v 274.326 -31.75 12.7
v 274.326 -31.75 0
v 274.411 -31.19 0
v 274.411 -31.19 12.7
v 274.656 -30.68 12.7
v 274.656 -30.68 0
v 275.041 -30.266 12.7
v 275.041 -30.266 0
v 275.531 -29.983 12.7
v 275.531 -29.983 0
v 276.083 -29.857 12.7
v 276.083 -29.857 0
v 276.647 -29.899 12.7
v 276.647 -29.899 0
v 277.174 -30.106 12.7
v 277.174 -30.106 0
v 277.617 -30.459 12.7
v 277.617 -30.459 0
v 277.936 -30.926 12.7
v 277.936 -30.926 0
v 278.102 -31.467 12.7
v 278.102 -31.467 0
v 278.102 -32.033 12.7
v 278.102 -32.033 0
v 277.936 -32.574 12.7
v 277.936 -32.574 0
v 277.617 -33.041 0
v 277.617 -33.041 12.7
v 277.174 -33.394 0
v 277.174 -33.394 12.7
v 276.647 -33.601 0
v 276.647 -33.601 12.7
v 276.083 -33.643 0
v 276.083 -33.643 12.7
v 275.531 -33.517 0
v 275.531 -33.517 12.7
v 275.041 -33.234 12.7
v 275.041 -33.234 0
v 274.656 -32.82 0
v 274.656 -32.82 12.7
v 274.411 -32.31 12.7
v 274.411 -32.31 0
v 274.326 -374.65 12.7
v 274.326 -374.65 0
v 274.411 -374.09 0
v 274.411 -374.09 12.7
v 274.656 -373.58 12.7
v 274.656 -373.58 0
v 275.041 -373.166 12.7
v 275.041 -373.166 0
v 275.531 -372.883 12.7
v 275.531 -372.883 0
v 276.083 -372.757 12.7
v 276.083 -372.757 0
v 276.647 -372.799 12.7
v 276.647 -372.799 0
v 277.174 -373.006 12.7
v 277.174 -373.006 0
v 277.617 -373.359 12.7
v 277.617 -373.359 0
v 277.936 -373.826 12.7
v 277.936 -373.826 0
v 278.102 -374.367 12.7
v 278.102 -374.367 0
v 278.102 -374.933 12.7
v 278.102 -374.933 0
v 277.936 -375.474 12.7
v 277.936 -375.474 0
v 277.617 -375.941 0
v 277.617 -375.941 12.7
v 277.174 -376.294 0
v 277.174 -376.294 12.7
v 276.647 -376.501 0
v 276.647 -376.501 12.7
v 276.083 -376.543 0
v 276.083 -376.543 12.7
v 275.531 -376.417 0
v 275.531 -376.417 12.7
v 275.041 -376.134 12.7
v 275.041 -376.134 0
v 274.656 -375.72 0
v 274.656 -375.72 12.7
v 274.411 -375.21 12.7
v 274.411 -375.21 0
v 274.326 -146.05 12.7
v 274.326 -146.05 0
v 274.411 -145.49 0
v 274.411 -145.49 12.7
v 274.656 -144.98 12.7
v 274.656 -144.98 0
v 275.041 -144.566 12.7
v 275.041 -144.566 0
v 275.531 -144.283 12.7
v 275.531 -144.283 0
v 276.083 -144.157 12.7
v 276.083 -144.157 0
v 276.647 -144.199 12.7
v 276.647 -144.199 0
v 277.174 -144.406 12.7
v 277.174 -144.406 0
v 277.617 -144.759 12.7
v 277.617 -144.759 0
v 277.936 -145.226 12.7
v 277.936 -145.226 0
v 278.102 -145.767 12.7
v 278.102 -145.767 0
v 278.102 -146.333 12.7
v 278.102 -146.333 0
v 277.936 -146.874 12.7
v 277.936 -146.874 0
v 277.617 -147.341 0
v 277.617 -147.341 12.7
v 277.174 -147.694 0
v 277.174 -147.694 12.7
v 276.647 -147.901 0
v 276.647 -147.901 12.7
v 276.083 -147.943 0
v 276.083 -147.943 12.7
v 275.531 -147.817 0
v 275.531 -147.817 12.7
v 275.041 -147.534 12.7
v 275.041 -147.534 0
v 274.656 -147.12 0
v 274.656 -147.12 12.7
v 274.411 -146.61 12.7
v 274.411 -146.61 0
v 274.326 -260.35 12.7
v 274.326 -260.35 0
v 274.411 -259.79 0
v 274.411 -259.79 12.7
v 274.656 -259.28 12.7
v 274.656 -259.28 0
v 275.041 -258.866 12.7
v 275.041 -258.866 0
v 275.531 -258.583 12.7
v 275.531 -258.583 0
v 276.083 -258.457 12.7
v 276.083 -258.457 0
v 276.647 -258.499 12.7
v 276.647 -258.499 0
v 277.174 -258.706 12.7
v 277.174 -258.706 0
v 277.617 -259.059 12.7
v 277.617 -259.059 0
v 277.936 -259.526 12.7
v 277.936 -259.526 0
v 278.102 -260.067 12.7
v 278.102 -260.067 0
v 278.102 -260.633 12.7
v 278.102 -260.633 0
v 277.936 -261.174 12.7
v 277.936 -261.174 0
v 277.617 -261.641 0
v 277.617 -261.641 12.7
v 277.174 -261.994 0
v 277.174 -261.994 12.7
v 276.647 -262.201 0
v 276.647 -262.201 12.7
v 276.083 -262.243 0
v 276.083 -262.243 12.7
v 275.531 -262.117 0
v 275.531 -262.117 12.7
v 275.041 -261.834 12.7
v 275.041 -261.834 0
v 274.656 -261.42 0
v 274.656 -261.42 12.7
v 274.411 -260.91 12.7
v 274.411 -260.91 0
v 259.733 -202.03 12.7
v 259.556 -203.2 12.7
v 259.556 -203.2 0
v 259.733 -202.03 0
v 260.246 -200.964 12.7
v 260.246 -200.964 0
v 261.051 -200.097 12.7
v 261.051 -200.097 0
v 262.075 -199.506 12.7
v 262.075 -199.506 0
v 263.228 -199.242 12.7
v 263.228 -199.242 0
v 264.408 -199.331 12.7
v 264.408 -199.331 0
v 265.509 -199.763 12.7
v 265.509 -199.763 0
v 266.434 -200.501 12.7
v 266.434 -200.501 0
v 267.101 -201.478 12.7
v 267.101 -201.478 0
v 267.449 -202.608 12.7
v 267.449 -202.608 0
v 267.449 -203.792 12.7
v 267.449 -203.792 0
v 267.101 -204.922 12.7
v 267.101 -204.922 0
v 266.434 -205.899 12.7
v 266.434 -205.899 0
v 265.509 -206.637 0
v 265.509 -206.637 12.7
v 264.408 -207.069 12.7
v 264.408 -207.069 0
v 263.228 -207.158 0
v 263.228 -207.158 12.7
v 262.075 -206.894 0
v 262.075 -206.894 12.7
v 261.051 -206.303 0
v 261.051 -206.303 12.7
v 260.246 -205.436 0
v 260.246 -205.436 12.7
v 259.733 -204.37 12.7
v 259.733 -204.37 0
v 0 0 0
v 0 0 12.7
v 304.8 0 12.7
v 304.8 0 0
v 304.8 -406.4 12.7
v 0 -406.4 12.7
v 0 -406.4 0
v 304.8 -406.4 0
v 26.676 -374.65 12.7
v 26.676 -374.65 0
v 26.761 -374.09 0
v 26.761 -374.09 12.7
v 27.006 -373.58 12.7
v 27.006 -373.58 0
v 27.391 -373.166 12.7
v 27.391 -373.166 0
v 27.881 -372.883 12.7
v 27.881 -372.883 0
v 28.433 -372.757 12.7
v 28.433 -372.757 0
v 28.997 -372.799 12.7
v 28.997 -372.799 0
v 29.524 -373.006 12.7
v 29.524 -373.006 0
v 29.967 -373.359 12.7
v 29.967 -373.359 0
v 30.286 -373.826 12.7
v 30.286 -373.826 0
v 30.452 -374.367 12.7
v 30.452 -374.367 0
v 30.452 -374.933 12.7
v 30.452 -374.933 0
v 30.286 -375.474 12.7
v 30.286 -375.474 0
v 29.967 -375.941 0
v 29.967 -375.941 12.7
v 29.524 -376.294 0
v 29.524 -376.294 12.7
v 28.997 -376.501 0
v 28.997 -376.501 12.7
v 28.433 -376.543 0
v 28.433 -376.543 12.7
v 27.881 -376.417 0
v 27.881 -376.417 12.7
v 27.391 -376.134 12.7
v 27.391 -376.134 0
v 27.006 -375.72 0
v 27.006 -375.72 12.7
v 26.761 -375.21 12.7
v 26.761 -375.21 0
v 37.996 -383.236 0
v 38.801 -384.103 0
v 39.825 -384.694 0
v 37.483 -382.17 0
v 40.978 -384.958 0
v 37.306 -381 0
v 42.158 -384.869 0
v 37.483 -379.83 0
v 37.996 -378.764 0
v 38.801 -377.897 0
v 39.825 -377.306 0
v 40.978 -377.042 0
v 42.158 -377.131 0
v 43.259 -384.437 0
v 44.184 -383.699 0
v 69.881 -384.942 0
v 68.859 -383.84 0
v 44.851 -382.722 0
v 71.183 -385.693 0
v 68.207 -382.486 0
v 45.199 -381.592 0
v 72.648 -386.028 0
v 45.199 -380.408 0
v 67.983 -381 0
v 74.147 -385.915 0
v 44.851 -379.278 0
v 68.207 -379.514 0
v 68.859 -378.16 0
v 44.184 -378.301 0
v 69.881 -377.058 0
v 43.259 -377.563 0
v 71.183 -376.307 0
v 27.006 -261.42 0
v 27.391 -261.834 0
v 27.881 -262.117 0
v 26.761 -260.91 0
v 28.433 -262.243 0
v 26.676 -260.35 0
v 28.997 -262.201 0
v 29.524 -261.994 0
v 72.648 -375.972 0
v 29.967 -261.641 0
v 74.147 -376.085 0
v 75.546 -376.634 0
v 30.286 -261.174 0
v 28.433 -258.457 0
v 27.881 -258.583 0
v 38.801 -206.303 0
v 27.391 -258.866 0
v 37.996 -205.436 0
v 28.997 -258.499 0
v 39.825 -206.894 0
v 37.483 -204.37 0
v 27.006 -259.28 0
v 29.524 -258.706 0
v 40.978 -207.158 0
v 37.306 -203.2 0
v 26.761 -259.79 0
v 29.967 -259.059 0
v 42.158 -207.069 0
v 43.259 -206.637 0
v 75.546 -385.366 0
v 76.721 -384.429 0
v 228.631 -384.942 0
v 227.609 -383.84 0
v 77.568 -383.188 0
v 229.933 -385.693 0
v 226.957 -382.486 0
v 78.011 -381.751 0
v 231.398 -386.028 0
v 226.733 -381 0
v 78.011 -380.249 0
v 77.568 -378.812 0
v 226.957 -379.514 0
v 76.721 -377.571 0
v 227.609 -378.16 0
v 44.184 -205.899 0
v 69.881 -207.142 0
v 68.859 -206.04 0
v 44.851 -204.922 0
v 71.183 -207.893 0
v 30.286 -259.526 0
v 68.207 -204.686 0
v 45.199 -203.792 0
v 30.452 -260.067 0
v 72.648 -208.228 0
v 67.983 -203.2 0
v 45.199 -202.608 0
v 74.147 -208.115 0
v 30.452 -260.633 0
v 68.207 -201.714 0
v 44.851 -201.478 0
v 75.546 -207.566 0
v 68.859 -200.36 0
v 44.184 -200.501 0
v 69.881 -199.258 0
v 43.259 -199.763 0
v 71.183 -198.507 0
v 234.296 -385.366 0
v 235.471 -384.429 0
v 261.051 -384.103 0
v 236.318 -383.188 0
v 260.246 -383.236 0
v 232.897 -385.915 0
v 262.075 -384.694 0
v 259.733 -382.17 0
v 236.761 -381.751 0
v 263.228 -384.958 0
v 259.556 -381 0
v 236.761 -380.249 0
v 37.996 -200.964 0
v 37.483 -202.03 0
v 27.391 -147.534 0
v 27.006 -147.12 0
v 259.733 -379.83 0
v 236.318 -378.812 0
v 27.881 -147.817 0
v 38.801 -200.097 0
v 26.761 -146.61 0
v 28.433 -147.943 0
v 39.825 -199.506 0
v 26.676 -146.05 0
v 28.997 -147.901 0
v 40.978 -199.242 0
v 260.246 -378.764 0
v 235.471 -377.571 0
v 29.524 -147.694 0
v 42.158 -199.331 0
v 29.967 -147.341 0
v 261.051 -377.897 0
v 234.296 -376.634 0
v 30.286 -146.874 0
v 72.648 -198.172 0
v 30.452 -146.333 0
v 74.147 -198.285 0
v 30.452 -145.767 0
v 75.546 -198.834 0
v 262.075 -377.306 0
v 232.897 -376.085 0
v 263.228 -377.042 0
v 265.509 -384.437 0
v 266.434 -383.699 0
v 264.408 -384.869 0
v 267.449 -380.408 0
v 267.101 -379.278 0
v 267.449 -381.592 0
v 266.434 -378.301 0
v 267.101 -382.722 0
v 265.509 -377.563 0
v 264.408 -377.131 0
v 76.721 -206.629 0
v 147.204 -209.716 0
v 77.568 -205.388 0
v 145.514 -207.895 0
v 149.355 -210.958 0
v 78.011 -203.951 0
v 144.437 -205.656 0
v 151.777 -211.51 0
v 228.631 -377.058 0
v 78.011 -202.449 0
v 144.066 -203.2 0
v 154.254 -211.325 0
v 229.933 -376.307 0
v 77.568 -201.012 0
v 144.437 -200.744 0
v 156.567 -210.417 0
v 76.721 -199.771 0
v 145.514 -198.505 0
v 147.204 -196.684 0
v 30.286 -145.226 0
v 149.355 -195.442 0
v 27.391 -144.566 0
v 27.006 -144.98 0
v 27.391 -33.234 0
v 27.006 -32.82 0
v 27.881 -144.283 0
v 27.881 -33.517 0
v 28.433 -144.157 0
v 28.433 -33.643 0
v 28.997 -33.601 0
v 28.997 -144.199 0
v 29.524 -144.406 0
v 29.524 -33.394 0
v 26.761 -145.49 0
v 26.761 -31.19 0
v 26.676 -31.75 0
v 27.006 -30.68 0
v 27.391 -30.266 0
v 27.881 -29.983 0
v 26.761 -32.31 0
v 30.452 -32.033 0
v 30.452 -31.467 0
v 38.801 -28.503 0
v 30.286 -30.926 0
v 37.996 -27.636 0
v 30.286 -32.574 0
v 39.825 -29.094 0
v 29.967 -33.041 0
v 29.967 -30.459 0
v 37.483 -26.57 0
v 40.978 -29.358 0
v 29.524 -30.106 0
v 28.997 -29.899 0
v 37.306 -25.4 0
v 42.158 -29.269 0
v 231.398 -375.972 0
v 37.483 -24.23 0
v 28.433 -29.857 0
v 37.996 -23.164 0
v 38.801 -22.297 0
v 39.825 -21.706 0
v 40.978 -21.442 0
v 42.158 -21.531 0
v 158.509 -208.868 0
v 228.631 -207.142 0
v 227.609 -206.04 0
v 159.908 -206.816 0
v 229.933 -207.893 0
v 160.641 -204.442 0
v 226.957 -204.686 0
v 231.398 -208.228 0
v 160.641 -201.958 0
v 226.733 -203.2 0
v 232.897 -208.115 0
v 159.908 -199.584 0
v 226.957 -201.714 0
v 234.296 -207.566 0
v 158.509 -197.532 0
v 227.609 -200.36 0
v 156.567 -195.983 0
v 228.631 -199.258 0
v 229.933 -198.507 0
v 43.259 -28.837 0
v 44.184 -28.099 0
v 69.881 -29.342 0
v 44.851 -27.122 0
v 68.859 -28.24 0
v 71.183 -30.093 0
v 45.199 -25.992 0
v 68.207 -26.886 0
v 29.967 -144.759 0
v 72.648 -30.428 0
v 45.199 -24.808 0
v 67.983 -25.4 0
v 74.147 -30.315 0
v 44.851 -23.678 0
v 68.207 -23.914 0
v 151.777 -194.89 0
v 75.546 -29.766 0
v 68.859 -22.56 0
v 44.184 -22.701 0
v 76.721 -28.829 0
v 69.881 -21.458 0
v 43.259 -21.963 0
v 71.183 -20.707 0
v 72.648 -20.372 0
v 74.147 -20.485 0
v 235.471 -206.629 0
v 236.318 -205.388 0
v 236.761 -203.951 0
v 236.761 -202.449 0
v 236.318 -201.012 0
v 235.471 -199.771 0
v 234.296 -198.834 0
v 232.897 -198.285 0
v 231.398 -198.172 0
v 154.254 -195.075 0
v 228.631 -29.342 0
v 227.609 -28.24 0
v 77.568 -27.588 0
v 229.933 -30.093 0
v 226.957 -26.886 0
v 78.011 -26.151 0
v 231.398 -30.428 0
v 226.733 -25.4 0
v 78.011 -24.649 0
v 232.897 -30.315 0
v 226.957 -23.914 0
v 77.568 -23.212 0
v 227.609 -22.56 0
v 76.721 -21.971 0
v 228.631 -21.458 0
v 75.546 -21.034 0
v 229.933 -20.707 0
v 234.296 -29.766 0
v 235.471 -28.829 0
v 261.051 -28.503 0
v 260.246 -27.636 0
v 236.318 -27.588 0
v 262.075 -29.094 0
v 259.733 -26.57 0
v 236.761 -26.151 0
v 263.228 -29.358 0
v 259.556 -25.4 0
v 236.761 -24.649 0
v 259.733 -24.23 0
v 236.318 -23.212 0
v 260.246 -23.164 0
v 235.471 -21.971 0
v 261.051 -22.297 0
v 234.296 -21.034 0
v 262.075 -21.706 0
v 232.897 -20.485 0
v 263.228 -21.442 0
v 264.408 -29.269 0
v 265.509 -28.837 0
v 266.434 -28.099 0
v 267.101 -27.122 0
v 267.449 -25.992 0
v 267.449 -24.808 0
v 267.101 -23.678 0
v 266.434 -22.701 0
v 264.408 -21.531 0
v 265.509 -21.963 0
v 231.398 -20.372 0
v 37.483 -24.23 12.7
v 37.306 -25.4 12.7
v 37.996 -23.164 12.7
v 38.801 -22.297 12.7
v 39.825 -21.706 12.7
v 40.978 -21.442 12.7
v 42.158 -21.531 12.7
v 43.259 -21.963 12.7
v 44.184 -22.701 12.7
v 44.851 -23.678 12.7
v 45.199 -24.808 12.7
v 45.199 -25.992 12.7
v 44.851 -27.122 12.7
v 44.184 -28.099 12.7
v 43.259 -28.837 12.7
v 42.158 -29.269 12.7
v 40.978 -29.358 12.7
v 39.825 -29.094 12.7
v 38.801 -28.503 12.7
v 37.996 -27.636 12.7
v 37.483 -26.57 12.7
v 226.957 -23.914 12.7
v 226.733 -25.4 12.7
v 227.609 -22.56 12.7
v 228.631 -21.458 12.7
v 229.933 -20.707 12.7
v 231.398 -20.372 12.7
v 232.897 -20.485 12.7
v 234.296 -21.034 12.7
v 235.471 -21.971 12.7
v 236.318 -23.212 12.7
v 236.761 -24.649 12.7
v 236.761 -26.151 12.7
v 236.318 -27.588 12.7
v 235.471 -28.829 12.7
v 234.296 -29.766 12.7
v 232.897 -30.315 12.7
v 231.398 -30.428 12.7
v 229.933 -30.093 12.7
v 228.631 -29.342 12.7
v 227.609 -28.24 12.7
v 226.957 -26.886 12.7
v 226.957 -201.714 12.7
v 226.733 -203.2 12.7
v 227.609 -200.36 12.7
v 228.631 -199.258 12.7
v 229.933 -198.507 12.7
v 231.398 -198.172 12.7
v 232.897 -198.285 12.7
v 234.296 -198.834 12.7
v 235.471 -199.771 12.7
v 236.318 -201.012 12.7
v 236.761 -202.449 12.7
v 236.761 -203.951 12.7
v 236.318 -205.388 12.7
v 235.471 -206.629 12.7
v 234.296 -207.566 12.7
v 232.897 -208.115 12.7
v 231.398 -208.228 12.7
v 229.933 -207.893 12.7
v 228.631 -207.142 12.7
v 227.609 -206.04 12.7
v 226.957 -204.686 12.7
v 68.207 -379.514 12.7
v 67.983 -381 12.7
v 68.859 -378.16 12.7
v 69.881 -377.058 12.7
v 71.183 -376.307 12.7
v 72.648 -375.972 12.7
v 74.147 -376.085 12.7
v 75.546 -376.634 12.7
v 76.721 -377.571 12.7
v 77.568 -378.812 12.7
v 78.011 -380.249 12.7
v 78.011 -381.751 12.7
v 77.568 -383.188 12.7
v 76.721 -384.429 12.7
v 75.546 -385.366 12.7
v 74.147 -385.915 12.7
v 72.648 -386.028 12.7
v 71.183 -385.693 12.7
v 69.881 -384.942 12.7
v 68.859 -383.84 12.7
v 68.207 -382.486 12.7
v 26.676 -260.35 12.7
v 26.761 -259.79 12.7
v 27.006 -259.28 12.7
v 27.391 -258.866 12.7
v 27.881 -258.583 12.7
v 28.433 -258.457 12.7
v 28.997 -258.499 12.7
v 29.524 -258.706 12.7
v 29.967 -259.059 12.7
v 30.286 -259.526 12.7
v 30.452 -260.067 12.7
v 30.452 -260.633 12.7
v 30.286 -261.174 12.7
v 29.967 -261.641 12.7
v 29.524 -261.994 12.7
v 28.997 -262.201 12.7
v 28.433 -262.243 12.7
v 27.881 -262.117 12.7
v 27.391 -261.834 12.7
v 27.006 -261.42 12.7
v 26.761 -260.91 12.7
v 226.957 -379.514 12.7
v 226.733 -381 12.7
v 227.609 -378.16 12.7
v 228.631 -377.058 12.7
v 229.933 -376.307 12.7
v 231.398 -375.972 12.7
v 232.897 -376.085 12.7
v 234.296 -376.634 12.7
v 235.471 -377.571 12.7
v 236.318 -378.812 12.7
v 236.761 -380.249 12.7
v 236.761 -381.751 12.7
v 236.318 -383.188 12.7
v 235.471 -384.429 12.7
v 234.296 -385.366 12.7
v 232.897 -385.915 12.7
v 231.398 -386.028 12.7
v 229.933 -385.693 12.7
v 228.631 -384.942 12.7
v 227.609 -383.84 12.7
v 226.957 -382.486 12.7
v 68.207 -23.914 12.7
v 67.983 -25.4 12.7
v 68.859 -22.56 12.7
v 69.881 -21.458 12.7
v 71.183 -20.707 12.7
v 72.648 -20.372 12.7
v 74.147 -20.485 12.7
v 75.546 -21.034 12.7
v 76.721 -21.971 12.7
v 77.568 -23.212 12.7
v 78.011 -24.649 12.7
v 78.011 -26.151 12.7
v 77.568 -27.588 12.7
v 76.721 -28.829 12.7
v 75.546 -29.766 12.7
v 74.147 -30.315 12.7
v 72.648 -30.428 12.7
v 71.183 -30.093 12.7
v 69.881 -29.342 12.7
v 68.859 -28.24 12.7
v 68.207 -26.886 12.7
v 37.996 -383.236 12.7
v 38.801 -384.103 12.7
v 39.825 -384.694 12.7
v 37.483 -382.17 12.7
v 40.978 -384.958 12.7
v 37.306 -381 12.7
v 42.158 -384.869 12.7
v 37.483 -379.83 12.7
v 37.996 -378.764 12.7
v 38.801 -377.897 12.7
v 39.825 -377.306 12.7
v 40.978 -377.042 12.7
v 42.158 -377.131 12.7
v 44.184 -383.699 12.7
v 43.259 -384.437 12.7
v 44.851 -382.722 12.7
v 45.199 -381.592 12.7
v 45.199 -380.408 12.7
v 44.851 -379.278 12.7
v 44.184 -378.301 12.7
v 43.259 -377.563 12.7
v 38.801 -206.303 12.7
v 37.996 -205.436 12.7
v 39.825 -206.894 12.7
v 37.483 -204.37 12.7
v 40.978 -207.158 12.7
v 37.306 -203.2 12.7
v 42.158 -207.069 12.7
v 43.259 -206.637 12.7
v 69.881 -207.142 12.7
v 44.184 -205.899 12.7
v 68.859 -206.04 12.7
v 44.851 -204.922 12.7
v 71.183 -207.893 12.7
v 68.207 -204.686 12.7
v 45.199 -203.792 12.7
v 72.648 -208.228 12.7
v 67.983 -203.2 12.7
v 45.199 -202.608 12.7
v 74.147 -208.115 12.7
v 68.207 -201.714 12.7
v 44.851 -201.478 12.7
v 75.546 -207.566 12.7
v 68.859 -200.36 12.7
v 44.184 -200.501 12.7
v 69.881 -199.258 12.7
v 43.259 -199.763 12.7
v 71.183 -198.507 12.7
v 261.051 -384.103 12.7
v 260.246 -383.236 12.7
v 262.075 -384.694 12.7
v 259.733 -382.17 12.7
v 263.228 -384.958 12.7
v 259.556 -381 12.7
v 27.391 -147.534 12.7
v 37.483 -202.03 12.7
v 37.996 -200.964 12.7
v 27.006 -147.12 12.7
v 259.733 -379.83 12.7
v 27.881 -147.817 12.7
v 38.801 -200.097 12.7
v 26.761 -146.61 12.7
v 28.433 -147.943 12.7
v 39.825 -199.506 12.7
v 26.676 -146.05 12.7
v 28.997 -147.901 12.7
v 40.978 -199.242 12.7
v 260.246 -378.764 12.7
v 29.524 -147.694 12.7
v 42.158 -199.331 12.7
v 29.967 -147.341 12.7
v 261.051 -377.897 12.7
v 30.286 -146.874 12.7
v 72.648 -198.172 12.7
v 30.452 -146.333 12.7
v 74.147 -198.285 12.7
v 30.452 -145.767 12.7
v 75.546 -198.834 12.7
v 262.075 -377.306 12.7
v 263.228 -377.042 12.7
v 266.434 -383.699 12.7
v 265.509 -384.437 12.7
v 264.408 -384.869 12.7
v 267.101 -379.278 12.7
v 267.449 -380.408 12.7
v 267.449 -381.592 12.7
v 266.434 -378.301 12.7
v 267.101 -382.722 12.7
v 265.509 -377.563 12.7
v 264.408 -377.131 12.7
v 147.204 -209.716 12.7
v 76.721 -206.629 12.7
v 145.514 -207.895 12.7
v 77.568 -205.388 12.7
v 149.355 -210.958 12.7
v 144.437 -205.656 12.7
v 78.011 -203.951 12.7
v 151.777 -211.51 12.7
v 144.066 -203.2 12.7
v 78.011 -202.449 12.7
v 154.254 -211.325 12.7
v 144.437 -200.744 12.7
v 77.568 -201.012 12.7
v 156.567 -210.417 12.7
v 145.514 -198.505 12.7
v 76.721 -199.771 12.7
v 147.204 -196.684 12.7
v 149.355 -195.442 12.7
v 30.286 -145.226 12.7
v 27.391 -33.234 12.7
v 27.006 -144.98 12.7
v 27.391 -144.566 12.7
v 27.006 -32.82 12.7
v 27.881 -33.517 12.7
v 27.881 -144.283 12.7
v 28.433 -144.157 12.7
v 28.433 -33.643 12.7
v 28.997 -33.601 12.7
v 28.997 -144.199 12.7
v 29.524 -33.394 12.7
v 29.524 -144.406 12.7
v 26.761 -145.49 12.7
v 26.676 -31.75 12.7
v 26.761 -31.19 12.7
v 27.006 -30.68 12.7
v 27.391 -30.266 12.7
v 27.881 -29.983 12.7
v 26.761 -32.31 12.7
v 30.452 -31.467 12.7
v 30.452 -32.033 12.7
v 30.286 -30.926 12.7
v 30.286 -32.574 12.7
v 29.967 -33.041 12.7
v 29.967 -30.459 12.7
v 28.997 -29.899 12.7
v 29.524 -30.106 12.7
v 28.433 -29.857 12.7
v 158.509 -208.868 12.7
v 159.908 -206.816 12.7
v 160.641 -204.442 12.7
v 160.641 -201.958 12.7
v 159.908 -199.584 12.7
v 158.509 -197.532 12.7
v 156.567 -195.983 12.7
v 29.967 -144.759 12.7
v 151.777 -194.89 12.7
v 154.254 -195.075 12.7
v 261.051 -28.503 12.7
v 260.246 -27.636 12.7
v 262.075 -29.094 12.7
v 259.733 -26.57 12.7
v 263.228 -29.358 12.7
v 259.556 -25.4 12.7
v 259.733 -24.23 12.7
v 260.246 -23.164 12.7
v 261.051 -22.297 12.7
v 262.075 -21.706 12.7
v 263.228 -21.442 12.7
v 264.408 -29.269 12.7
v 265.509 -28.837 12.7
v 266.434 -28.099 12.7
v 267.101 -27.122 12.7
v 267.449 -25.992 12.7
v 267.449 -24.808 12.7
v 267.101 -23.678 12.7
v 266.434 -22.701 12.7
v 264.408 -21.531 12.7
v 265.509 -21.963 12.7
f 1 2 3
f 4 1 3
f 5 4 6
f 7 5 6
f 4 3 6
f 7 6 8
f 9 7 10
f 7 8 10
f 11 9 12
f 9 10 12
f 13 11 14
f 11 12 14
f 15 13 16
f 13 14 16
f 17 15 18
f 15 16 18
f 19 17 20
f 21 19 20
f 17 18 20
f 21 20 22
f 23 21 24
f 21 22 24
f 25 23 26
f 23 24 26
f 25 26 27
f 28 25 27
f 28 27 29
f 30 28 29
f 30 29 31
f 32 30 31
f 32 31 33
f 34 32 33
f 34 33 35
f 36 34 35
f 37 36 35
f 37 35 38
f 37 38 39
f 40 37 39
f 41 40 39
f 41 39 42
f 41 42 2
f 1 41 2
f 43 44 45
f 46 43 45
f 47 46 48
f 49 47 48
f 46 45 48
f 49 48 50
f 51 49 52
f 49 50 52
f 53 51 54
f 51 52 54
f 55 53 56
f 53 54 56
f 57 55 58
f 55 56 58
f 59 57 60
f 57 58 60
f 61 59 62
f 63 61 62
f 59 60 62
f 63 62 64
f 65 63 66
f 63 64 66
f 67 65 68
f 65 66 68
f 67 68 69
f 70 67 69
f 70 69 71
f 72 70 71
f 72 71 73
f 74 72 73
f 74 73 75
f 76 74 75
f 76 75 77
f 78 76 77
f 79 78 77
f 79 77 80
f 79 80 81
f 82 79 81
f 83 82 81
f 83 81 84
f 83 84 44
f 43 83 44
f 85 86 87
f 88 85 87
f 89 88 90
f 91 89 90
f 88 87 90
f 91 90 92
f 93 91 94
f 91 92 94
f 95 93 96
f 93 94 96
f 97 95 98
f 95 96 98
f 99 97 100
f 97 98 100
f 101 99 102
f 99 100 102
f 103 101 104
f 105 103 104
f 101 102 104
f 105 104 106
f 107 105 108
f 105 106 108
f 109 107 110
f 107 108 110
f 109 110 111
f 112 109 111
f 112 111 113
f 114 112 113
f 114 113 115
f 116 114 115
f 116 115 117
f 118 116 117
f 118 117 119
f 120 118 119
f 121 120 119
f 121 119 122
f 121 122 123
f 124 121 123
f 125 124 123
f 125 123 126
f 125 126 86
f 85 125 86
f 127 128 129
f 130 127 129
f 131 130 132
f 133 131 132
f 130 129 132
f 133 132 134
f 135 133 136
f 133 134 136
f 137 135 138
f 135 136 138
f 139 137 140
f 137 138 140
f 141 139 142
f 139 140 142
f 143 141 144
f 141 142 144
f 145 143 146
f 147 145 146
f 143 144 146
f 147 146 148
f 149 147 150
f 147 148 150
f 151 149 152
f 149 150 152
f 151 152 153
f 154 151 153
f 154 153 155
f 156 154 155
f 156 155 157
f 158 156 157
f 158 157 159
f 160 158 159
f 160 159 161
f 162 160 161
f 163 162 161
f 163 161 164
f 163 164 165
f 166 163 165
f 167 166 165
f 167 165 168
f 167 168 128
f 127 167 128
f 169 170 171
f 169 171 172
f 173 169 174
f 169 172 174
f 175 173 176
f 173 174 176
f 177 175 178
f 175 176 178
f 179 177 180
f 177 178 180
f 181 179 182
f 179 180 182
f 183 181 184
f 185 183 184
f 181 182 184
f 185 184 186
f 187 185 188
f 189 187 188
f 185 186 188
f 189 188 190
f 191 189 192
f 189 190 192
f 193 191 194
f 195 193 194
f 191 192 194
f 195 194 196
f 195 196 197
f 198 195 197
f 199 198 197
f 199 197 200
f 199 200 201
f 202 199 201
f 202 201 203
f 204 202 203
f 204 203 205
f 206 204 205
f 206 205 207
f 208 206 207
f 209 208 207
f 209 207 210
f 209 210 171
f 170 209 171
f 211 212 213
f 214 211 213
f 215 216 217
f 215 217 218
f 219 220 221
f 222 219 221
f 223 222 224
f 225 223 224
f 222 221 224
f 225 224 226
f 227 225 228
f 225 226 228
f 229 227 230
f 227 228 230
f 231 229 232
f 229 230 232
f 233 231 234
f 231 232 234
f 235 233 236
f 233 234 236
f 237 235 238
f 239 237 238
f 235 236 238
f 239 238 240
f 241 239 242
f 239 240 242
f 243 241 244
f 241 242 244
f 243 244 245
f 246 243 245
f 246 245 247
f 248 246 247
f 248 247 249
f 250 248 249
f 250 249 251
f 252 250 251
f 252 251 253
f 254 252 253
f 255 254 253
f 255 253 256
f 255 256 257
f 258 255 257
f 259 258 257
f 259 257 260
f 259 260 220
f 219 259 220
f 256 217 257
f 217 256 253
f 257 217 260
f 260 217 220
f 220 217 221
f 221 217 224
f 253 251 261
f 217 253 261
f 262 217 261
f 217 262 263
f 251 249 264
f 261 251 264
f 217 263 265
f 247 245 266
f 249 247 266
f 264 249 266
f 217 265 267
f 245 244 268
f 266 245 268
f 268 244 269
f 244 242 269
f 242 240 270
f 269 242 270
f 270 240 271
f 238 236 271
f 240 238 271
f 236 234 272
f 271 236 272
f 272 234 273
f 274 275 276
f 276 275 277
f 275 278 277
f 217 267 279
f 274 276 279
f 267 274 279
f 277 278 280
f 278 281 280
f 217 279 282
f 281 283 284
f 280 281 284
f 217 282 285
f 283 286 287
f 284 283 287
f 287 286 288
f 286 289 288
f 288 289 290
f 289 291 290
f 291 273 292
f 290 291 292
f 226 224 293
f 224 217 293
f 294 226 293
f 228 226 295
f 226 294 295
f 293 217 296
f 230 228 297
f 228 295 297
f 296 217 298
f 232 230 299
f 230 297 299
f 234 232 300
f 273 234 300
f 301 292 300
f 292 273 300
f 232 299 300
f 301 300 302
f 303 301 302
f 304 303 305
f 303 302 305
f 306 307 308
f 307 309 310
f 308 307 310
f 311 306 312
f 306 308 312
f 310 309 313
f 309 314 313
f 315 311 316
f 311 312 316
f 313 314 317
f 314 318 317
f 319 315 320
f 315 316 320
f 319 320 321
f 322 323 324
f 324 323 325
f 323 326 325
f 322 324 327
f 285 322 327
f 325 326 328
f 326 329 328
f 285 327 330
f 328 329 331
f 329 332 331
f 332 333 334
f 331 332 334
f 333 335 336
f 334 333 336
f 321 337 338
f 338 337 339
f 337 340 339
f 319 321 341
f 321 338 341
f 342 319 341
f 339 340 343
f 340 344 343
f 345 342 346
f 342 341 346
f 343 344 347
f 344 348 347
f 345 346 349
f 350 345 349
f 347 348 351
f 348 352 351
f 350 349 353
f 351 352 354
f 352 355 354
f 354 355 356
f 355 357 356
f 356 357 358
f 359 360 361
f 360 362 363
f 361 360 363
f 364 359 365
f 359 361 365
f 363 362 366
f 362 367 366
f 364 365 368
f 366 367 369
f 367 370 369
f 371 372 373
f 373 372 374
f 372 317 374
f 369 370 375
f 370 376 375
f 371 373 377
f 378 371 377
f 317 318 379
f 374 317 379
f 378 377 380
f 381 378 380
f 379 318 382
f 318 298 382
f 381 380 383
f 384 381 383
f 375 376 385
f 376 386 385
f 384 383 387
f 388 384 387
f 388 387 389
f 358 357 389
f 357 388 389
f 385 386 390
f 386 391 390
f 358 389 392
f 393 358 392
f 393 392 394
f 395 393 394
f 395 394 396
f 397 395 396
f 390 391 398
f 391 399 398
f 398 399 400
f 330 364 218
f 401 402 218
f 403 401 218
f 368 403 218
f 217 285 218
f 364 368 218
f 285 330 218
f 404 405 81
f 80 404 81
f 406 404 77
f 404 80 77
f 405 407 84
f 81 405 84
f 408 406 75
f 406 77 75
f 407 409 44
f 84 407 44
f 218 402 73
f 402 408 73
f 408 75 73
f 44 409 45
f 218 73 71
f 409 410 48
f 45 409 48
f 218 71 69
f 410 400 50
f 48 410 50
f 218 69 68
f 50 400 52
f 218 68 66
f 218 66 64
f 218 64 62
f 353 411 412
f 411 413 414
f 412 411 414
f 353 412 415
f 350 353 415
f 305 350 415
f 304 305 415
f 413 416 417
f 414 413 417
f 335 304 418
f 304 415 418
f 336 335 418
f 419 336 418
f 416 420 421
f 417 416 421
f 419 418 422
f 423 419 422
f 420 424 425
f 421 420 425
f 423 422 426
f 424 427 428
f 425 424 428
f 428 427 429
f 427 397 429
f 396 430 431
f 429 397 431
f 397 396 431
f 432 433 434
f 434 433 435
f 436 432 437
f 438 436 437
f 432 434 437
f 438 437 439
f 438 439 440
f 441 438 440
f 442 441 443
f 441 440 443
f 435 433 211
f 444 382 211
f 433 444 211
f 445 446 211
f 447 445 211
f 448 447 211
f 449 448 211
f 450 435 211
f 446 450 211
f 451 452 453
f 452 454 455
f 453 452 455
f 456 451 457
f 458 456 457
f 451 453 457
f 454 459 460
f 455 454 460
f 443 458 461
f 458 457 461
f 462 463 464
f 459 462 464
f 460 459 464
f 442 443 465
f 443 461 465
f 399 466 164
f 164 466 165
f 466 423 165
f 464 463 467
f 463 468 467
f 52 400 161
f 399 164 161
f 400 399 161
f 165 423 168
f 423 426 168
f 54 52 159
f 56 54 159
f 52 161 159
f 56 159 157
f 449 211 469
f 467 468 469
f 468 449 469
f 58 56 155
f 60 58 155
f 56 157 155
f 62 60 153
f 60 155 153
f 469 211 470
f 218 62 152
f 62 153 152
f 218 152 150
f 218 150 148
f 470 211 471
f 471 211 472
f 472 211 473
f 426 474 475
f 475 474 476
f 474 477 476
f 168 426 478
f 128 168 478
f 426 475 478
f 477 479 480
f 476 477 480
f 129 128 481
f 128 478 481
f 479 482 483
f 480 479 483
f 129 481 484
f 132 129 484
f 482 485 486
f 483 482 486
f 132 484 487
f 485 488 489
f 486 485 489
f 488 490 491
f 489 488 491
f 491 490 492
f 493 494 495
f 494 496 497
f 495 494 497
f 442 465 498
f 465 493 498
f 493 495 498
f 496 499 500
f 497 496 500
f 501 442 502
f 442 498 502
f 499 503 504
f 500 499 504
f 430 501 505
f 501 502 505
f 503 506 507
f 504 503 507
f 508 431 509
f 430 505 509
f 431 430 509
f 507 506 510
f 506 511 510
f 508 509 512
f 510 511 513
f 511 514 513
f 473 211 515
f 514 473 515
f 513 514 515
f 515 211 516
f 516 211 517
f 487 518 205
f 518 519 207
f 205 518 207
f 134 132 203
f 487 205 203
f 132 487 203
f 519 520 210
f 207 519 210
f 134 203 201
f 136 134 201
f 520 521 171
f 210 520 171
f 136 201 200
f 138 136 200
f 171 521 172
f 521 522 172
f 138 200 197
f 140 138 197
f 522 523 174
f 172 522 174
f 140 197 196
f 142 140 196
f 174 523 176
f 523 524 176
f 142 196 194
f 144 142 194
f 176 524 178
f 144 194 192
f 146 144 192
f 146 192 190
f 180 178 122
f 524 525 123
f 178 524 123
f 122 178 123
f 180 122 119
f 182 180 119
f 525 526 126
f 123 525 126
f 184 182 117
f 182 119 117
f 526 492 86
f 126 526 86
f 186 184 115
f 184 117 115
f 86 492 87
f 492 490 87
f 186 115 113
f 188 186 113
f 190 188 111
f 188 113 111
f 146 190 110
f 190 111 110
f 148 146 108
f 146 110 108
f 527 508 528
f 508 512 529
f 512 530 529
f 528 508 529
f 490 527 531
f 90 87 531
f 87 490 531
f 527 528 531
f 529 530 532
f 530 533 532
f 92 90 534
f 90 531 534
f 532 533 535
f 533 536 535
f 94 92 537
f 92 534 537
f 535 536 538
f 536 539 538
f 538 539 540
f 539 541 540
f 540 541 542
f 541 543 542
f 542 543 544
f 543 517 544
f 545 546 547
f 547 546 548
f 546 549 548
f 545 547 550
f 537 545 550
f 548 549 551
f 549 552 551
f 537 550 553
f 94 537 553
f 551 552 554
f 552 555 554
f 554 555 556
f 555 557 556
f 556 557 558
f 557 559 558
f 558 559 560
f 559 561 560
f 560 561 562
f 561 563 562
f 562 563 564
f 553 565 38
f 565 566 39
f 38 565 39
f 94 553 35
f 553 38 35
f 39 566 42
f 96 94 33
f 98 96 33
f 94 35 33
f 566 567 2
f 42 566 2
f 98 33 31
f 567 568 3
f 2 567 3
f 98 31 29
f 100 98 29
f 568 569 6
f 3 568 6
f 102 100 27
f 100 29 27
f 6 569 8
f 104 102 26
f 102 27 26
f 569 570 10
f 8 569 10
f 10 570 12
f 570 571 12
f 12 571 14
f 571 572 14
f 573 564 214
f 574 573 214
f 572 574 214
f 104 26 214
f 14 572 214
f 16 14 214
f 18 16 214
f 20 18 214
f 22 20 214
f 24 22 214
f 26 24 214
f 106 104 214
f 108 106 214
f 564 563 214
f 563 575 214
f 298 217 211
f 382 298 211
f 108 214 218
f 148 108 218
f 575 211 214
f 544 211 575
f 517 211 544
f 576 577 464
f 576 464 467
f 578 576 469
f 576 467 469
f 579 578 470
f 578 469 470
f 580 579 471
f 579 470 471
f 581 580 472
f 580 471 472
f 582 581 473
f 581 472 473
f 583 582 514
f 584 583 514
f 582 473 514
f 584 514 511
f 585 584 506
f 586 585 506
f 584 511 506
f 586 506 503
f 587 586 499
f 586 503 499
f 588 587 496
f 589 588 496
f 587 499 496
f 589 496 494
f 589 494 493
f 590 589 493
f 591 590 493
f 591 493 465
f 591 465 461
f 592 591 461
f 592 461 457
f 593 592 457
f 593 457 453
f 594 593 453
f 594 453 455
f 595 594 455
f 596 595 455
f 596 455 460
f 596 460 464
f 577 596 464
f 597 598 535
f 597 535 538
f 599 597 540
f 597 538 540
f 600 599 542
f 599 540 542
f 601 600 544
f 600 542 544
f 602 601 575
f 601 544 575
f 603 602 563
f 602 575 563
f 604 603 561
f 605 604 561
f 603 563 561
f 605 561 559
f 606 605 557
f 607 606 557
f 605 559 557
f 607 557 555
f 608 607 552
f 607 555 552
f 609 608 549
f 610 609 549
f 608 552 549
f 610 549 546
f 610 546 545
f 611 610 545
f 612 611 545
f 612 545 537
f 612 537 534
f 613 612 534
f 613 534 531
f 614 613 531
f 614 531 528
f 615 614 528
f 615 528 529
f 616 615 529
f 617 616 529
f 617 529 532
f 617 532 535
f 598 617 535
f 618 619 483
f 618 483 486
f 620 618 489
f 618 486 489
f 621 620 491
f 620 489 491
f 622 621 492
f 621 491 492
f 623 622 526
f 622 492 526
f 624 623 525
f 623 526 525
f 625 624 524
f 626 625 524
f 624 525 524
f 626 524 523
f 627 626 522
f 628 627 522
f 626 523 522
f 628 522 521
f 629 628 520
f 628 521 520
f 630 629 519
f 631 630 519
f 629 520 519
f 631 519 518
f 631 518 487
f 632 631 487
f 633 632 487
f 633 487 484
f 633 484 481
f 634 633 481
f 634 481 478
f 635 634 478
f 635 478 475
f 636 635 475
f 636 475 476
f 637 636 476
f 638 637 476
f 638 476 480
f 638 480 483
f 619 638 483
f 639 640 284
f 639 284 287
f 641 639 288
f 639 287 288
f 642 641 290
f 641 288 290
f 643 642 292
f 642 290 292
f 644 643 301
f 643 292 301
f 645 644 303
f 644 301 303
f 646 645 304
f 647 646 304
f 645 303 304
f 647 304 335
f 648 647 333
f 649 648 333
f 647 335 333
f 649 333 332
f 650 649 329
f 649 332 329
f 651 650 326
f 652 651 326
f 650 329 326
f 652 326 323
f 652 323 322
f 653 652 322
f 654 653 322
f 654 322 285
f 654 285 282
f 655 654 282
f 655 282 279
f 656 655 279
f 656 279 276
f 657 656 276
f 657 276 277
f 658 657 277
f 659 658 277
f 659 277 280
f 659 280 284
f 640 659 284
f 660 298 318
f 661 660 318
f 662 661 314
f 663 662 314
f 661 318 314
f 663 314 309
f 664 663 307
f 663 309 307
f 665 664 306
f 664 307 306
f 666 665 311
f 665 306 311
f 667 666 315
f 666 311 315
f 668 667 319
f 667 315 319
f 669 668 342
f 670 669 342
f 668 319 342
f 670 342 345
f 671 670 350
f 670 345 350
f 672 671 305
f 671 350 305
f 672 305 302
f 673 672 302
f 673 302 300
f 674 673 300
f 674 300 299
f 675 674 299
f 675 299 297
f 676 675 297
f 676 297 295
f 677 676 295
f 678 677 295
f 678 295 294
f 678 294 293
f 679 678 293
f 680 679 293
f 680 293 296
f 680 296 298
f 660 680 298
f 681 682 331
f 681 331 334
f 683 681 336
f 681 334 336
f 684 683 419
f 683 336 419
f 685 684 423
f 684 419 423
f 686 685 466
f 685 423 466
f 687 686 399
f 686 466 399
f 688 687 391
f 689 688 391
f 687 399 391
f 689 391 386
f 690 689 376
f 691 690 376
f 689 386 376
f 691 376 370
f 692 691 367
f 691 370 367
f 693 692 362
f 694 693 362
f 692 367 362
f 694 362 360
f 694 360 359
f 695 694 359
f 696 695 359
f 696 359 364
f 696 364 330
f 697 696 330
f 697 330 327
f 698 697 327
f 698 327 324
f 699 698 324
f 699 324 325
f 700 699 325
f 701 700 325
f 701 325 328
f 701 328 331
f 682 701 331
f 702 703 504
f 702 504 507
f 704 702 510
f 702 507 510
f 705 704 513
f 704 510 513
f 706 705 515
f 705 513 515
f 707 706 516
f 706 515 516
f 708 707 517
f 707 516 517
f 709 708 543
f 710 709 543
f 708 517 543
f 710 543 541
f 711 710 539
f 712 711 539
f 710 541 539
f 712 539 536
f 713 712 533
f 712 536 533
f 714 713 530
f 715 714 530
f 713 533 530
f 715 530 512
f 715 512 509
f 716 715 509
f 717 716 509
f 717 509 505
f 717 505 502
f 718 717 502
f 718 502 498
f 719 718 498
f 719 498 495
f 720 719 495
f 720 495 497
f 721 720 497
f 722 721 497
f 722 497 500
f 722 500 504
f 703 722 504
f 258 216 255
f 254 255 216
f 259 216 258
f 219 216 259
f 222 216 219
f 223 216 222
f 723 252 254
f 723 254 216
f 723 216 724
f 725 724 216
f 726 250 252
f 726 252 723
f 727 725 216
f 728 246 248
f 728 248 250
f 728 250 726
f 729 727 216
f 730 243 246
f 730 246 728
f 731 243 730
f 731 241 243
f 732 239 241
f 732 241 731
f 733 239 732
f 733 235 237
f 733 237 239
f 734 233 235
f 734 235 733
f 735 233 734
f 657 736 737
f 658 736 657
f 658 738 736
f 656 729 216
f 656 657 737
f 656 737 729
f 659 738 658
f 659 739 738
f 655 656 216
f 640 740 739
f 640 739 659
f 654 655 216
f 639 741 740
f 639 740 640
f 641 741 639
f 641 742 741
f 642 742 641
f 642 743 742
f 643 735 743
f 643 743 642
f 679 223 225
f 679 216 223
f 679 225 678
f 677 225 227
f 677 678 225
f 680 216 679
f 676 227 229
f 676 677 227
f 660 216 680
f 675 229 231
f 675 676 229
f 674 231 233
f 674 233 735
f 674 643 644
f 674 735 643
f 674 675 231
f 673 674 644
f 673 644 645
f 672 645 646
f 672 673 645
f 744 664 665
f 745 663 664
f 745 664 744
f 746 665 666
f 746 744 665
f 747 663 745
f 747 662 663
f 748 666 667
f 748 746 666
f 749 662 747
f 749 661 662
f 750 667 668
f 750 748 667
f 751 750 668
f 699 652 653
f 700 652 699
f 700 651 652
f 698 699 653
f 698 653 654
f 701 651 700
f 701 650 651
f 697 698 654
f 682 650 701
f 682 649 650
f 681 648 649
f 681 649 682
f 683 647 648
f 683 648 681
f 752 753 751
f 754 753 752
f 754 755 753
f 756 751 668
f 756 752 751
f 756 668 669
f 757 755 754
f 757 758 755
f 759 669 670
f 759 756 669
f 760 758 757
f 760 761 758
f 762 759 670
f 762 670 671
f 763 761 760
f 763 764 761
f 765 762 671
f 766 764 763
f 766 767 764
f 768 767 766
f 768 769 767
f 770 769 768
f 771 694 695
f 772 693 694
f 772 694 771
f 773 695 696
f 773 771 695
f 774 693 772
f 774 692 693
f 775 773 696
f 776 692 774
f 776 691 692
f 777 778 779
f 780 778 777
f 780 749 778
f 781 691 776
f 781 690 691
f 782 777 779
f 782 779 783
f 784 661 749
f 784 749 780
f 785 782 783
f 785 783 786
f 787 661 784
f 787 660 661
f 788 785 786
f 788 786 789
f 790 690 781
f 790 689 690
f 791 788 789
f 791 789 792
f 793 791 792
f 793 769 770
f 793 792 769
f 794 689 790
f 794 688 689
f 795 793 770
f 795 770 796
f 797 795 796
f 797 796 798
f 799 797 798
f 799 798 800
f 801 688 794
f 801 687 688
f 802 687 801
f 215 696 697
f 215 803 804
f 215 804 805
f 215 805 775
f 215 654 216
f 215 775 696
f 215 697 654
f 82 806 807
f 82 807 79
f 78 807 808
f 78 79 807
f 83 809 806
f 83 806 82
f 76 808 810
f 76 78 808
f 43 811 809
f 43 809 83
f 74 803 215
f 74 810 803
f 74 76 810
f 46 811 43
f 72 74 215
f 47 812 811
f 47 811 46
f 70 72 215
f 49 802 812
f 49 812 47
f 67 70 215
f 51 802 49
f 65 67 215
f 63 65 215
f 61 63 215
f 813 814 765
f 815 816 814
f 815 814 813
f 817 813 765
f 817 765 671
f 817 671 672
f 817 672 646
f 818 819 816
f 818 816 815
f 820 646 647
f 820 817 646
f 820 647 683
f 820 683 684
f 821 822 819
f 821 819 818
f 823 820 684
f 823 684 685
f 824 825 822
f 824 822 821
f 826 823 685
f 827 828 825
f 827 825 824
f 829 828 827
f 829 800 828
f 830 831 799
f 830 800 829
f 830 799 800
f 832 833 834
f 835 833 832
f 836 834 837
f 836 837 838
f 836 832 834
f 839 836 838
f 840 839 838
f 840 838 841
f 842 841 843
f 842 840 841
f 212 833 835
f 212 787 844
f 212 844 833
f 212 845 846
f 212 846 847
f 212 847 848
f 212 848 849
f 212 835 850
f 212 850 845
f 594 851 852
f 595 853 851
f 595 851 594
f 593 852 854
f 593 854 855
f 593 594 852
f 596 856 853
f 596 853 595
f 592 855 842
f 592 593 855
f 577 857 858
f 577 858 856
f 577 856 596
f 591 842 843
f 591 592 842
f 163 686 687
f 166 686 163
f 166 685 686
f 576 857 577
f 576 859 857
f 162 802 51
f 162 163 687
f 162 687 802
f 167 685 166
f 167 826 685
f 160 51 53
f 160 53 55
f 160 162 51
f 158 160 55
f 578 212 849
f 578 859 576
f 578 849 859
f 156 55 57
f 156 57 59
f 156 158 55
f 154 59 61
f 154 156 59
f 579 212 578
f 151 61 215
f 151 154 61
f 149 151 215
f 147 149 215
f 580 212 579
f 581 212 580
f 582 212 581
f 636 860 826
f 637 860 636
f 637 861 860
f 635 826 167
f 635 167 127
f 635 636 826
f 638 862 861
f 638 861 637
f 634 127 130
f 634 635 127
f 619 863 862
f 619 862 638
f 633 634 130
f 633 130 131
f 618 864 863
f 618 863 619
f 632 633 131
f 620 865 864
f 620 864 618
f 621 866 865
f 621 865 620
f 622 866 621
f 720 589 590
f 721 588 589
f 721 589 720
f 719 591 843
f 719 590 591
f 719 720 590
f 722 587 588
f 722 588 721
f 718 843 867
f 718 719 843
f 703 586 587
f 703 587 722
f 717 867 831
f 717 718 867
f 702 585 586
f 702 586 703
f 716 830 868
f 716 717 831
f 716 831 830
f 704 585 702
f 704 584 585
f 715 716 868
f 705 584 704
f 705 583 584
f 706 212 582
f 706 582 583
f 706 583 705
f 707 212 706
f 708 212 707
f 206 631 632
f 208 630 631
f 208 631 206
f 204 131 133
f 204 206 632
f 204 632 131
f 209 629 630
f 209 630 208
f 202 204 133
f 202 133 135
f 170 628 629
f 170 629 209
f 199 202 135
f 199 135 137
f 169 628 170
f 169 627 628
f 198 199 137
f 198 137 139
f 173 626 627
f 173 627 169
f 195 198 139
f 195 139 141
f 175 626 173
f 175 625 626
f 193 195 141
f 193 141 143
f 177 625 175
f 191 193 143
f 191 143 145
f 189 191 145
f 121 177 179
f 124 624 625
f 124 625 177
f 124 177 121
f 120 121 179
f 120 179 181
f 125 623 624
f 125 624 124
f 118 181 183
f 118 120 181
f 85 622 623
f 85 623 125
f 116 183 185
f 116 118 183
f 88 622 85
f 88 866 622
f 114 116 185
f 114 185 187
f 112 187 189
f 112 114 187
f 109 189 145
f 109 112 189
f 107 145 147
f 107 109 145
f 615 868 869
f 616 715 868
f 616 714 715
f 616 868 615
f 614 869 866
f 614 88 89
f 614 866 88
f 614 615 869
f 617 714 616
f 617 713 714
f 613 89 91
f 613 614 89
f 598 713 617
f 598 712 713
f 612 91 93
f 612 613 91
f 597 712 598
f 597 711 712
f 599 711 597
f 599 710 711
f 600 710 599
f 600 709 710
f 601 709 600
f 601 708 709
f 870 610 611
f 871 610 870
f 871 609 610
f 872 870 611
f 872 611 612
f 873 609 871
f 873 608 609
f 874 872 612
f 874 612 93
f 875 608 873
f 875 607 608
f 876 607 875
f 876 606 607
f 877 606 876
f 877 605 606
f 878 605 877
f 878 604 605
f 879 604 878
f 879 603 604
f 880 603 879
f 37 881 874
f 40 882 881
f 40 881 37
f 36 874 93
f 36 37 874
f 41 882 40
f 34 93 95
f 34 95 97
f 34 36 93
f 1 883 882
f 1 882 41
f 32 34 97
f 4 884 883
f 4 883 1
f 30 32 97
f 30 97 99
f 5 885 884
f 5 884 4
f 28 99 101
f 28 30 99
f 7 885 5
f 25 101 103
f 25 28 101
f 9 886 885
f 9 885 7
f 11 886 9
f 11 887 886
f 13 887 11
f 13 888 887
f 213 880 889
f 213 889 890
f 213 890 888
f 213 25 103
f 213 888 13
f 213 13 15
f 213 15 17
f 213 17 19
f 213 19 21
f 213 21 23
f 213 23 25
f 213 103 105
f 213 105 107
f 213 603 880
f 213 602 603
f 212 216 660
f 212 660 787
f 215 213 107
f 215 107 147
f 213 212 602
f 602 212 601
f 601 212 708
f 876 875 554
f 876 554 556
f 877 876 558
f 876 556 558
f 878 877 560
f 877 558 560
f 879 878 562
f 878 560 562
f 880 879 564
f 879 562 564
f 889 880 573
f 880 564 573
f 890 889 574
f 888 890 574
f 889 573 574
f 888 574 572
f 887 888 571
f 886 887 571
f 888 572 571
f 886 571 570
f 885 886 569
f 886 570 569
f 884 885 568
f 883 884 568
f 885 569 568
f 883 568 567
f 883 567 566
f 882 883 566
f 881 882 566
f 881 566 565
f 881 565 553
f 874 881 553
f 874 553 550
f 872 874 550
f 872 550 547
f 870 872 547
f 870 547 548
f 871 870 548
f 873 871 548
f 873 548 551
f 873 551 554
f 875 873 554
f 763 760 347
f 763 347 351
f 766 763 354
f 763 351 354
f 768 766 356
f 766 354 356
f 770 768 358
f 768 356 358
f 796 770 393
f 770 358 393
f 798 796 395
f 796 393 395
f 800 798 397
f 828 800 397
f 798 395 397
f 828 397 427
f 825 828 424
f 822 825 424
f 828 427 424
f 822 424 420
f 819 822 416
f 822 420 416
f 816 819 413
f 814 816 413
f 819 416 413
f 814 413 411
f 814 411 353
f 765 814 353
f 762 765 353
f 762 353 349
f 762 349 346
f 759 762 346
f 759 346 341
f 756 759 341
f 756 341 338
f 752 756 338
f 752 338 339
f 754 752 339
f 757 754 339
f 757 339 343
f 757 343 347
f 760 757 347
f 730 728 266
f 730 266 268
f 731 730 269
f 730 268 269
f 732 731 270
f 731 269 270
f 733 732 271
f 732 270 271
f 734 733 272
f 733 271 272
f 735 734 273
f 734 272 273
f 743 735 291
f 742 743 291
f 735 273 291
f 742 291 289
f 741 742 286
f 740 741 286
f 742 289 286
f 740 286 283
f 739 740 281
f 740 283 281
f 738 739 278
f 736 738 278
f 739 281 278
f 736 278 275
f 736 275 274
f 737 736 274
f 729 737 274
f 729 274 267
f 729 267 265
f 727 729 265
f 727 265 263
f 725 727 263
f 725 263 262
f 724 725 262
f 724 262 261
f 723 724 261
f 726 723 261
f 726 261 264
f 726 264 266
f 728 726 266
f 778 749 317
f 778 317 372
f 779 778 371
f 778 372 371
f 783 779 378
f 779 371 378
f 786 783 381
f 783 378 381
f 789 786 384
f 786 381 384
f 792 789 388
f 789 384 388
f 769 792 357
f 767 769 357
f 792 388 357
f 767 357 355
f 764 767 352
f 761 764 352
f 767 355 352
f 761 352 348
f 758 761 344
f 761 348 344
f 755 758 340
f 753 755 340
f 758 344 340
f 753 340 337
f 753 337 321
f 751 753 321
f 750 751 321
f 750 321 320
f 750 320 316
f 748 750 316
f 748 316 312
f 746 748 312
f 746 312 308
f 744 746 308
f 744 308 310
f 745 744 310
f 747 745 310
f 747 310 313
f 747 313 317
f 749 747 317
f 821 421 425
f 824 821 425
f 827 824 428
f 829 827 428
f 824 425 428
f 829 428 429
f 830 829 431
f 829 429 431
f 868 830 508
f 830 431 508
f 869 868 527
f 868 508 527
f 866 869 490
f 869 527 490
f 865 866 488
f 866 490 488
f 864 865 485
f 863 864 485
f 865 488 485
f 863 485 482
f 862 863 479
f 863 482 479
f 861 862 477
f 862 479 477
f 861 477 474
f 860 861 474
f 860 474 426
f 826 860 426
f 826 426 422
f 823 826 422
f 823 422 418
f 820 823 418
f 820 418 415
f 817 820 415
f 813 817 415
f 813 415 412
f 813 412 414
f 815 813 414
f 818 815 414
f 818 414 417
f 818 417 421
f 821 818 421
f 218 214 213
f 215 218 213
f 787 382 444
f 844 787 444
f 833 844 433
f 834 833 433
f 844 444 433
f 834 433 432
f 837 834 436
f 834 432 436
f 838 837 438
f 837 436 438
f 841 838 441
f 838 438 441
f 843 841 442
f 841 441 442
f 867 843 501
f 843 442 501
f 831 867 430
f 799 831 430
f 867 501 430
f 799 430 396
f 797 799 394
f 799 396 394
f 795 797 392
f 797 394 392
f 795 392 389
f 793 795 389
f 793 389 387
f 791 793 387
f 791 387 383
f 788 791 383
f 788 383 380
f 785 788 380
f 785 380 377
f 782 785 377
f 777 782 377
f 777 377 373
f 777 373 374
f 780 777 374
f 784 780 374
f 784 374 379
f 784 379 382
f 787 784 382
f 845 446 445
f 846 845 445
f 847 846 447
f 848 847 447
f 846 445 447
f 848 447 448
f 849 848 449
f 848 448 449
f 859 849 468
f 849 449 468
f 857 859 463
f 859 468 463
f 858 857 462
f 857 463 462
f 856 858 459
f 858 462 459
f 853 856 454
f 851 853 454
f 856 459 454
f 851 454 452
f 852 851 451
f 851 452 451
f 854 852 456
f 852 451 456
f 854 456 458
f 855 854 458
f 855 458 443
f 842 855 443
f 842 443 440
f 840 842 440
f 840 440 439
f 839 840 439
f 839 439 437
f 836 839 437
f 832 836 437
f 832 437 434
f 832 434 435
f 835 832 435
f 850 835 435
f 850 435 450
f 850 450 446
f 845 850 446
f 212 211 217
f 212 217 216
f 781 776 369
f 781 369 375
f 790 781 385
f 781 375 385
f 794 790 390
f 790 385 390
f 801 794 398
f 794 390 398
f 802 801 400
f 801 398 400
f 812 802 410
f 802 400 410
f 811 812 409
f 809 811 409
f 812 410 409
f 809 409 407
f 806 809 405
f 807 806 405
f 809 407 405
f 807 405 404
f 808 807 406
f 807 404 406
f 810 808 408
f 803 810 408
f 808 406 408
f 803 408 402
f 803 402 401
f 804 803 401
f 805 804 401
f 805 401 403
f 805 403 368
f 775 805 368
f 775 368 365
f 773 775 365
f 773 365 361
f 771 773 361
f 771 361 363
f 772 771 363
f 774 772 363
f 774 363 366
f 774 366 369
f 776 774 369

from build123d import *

# Parameters (mm, degrees)
F0_W     = 304.8
F0_H     = 12.7
F1_DEPTH = 406.4
F3_D     = 7.9375
F3_DEPTH = 20.6629
F3_TIP   = 2.3846655818
F4_D     = 10.0838
F4_DEPTH = 20.6756
F4_TIP   = 3.0294791551
F5_D     = 16.66748
F5_DEPTH = 19.1008
F5_TIP   = 5.0074161752
F7_D     = 3.7973
F7_DEPTH = 19.1008
F7_TIP   = 1.1408240143


with BuildPart() as f1:
    # F0 (on Front) → F1 (new body)
    with BuildSketch(Plane.XZ):
        with Locations((152.4, 6.35)):
            Rectangle(F0_W, F0_H)
    extrude(amount=F1_DEPTH)

    # F3
    with Locations(Plane.XY.offset(12.7)):
        with Locations((41.275, -381), (41.275, -203.2), (41.275, -25.4), (263.525, -25.4), (263.525, -203.2), (263.525, -381)):
            Hole(F3_D / 2, depth=F3_DEPTH)
            with Locations((0, 0, -(F3_DEPTH + F3_TIP / 2))):  # 118° drill point
                Cone(0, F3_D / 2, F3_TIP, mode=Mode.SUBTRACT)

    # F4
    with Locations(Plane.XY.offset(12.7)):
        with Locations((73.025, -381), (73.025, -203.2), (73.025, -25.4), (231.775, -381), (231.775, -203.2), (231.775, -25.4)):
            Hole(F4_D / 2, depth=F4_DEPTH)
            with Locations((0, 0, -(F4_DEPTH + F4_TIP / 2))):  # 118° drill point
                Cone(0, F4_D / 2, F4_TIP, mode=Mode.SUBTRACT)

    # F5
    with Locations(Plane.XY.offset(12.7)):
        with Locations((152.4, -203.2)):
            Hole(F5_D / 2, depth=F5_DEPTH)
            with Locations((0, 0, -(F5_DEPTH + F5_TIP / 2))):  # 118° drill point
                Cone(0, F5_D / 2, F5_TIP, mode=Mode.SUBTRACT)

    # F7
    with Locations(Plane.XY.offset(12.7)):
        with Locations((28.575, -31.75), (276.225, -31.75), (276.225, -146.05), (276.225, -260.35), (276.225, -374.65), (28.575, -374.65), (28.575, -260.35), (28.575, -146.05)):
            Hole(F7_D / 2, depth=F7_DEPTH)
            with Locations((0, 0, -(F7_DEPTH + F7_TIP / 2))):  # 118° drill point
                Cone(0, F7_D / 2, F7_TIP, mode=Mode.SUBTRACT)


solid = f1.part
